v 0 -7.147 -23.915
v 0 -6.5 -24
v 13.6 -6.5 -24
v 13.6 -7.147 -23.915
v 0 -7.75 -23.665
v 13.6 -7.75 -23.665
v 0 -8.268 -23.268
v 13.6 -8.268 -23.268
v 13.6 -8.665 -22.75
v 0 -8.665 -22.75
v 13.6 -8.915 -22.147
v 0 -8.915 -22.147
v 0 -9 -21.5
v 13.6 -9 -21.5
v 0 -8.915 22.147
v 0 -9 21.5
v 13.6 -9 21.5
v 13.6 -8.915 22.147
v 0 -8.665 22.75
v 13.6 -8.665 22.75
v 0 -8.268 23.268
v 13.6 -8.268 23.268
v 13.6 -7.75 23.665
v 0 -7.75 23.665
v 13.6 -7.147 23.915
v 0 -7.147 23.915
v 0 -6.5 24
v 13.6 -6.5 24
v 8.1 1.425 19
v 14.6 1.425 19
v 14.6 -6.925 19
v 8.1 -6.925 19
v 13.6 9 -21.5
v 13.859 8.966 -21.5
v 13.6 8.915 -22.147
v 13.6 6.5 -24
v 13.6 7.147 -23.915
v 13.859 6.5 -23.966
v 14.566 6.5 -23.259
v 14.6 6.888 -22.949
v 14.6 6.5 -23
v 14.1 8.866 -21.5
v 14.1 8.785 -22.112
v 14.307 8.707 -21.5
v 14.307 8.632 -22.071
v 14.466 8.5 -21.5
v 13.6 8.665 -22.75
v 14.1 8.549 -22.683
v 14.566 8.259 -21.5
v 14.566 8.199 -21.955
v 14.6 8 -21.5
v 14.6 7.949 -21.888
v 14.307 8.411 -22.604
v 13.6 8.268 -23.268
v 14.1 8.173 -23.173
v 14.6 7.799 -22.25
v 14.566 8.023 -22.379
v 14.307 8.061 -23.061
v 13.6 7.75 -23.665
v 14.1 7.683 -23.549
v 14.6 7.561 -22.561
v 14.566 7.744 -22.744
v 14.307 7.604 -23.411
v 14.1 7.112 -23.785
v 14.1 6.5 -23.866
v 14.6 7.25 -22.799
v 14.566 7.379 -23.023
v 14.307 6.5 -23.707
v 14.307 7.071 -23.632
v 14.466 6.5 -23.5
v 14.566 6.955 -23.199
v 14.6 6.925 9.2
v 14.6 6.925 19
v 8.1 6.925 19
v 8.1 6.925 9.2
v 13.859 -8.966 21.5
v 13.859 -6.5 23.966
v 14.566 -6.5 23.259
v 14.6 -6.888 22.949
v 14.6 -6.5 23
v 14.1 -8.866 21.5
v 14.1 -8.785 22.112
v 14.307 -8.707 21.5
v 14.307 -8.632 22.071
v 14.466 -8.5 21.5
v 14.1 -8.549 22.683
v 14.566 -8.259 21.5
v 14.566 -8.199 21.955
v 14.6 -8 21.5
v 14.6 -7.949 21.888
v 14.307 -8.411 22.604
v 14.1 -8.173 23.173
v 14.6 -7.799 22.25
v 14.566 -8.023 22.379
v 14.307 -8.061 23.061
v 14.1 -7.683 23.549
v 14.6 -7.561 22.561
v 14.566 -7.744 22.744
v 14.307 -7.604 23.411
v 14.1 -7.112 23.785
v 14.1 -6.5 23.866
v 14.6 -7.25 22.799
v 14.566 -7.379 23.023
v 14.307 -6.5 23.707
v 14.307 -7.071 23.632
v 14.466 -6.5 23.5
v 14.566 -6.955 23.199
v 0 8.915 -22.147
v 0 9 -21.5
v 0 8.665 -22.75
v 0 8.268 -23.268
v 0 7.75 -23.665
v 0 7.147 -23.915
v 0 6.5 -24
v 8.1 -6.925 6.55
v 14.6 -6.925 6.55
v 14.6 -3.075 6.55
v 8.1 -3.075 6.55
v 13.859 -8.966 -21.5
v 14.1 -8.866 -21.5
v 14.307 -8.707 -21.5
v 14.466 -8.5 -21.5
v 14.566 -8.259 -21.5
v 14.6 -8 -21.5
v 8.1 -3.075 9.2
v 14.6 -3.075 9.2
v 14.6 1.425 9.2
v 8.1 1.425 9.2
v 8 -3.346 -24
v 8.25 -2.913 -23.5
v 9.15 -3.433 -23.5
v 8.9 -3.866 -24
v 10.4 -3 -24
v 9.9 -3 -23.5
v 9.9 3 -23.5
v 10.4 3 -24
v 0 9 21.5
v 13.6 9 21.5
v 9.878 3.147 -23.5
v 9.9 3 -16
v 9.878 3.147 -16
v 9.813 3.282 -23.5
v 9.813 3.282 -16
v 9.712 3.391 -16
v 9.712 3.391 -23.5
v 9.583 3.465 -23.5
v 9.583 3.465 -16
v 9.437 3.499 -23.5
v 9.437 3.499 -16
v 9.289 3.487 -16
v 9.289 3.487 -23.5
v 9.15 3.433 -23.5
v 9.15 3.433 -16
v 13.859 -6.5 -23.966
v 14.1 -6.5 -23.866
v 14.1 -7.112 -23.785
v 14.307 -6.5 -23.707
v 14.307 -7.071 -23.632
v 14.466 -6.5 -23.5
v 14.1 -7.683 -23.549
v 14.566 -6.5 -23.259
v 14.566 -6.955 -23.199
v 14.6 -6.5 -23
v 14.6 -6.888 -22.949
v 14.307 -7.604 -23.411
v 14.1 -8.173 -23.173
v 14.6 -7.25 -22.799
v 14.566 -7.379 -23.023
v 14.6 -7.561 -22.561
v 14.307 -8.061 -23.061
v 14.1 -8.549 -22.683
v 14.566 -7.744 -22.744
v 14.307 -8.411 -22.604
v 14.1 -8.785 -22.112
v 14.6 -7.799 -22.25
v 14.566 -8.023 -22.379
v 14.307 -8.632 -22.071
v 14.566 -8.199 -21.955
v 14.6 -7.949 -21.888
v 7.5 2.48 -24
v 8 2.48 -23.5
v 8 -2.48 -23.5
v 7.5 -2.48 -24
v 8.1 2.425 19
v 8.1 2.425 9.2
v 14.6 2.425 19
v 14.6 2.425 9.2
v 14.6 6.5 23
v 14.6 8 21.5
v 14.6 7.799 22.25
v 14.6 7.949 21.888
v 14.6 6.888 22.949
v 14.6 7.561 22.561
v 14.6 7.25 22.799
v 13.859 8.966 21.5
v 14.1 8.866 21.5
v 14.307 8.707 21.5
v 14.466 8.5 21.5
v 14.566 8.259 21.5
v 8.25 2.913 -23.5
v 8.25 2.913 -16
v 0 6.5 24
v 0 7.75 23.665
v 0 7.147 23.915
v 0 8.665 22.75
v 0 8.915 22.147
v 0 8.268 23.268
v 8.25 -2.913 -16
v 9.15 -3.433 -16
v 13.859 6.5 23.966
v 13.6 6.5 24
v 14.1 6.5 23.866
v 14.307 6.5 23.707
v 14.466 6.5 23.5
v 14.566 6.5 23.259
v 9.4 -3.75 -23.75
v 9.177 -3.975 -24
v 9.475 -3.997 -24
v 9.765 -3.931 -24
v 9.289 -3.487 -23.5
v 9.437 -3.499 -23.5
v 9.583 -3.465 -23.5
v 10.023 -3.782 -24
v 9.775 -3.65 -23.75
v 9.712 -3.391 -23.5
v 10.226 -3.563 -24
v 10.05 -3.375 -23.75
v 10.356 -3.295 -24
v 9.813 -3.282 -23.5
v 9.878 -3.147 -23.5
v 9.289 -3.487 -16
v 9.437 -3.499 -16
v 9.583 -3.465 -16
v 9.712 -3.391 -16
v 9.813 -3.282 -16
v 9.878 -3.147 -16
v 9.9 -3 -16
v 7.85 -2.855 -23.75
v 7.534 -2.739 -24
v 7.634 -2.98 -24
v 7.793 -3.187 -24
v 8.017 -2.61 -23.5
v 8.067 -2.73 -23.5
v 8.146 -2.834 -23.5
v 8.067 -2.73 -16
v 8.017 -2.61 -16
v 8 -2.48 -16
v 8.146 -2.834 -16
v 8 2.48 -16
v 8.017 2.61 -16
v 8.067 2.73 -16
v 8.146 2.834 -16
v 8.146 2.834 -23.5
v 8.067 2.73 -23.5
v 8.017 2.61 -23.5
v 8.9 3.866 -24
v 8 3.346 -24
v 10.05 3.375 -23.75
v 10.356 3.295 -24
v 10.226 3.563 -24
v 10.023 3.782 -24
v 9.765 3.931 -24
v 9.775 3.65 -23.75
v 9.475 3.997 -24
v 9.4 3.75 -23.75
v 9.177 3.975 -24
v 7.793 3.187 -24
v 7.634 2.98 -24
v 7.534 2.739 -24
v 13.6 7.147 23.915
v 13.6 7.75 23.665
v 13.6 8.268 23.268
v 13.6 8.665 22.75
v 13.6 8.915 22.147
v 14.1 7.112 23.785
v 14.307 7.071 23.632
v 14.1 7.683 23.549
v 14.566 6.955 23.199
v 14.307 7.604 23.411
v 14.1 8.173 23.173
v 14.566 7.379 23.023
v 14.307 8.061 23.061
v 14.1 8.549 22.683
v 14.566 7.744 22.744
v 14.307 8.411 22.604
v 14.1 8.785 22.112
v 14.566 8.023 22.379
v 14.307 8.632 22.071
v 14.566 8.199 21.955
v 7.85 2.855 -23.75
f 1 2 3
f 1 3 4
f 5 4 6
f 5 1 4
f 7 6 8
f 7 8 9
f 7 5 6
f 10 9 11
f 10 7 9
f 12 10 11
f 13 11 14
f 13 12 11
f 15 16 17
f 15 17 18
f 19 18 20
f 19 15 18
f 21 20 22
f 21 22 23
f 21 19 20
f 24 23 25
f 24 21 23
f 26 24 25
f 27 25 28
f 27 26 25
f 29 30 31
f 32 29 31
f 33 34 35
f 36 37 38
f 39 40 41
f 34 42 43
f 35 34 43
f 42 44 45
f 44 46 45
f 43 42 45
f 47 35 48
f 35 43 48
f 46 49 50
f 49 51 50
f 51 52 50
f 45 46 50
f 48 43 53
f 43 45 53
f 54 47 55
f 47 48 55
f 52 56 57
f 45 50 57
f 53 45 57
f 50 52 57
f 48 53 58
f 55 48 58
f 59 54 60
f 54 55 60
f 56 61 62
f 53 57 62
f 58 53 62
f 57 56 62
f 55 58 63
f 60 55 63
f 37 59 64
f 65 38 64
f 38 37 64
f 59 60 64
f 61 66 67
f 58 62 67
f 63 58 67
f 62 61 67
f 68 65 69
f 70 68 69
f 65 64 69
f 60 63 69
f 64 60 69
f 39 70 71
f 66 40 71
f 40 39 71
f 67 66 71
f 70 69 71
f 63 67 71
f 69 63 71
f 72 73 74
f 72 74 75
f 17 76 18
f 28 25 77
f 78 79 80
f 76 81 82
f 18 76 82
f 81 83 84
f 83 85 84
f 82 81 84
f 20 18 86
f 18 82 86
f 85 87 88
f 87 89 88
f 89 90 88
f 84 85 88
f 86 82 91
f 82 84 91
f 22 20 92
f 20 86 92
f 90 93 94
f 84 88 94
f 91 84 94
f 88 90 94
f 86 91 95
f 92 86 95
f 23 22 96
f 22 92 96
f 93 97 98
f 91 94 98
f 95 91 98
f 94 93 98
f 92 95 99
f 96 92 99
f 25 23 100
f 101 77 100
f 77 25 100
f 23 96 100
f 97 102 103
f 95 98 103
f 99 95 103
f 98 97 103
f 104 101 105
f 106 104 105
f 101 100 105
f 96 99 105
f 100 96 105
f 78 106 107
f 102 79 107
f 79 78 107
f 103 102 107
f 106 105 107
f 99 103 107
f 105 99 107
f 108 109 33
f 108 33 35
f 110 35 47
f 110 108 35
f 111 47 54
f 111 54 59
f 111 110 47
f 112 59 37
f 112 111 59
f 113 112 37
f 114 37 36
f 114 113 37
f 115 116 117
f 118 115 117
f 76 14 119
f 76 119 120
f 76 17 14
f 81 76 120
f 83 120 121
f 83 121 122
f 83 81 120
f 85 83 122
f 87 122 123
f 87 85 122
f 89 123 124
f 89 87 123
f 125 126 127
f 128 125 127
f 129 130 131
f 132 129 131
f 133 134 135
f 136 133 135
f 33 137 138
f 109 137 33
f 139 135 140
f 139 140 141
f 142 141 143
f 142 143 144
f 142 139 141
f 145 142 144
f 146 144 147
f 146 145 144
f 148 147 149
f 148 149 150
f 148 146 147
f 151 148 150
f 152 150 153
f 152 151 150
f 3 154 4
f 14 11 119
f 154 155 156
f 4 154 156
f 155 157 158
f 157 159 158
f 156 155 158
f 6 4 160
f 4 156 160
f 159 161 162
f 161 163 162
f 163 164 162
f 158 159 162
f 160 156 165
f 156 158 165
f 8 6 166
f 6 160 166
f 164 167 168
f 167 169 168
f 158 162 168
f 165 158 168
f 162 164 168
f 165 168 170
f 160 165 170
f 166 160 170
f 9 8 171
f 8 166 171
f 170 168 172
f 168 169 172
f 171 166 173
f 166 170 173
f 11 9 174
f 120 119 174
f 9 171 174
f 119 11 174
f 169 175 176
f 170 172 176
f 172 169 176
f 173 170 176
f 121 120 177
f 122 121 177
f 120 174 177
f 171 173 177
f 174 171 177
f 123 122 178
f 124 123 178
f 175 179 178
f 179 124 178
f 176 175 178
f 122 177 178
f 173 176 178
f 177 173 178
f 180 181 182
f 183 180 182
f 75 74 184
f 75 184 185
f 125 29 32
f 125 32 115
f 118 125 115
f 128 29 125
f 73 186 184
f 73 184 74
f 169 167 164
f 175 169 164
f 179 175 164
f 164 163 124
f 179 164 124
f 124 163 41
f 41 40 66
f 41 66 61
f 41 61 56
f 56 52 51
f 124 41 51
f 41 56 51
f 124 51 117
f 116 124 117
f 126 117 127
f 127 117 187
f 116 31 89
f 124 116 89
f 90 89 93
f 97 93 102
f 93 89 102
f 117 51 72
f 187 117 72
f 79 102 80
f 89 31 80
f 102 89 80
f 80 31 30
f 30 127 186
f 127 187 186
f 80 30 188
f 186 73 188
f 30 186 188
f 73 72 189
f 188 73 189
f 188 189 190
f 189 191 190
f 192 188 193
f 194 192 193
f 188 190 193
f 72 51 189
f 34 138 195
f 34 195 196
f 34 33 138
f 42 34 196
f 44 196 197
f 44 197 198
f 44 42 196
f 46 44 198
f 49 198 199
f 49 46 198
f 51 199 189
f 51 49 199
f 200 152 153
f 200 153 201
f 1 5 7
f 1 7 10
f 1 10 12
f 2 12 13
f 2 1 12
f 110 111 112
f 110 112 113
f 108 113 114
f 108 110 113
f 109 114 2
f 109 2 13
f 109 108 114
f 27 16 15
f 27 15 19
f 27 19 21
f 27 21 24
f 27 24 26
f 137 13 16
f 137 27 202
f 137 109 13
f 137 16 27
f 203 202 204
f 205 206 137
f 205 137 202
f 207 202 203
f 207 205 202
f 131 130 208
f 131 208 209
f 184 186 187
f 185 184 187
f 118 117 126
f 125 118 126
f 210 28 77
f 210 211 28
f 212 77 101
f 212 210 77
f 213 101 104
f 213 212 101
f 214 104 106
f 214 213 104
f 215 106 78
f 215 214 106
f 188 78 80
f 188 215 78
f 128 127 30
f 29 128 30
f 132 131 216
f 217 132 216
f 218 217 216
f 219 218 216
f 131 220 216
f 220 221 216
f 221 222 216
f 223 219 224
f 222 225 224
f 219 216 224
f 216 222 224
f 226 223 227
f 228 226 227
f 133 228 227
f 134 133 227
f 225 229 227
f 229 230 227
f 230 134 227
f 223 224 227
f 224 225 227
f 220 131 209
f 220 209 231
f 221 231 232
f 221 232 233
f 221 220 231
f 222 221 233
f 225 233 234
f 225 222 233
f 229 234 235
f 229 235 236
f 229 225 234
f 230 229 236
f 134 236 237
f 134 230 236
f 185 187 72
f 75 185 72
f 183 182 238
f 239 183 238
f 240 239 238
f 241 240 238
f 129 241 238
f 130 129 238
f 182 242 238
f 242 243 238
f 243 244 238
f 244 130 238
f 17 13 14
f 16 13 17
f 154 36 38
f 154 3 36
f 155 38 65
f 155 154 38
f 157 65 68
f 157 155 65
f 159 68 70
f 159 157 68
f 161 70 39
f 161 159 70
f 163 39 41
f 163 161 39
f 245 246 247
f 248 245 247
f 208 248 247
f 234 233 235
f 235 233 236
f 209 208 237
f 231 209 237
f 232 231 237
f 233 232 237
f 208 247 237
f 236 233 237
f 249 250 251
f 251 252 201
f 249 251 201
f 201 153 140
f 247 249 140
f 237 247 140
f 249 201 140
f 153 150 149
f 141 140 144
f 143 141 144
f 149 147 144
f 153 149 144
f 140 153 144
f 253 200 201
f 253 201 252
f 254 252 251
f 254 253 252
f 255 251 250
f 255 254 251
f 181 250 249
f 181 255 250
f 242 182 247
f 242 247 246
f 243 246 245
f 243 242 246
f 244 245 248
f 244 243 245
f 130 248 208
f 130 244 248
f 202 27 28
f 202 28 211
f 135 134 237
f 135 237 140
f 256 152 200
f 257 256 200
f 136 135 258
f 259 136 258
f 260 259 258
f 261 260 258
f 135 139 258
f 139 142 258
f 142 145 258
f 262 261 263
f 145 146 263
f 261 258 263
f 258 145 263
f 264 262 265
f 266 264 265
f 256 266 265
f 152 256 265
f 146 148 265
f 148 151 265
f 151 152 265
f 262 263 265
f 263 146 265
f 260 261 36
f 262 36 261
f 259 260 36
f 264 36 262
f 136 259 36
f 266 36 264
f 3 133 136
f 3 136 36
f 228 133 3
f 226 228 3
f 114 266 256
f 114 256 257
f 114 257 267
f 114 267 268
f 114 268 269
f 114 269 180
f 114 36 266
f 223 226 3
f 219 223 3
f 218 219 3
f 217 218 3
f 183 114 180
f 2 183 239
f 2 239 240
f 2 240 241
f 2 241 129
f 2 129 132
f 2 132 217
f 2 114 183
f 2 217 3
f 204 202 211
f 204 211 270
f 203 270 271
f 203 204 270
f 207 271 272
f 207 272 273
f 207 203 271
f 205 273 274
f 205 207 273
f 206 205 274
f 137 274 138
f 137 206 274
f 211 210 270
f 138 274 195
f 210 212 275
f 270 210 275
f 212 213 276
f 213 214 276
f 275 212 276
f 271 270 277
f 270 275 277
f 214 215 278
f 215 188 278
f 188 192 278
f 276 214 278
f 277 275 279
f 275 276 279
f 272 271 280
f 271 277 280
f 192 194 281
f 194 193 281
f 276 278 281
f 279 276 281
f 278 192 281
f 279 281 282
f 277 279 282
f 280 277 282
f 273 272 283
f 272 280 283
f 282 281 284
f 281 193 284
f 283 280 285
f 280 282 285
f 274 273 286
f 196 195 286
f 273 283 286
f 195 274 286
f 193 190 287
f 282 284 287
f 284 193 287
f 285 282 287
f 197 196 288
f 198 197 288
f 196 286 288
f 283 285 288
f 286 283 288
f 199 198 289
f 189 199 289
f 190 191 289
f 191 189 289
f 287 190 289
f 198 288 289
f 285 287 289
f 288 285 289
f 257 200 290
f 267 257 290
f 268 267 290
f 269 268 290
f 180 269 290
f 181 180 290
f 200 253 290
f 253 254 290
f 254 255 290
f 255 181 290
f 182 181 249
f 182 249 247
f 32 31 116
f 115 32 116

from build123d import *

# Parameters (mm, degrees)
EXTRUDE_1_DEPTH     = 14.6
FILLET_1_R          = 1
CUT_EXTRUDE_1_DEPTH = 8
CHAMFER_1_SIZE      = 0.5
SKETCH_3_W          = 9.8
SKETCH_3_H          = 4.5
CUT_EXTRUDE_2_DEPTH = 6.5


with BuildPart() as part:
    # ｽｹｯﾁ1 → ﾎﾞｽ - 押し出し1 (new body)
    with BuildSketch(Plane(origin=(0, 0, 0), x_dir=(0, 0, -1), z_dir=(1, 0, 0))):
        with BuildLine():
            Line((-21.5, 9), (21.5, 9))
            ThreePointArc((21.5, 9), (23.267766953, 8.267766953), (24, 6.5))
            Line((24, 6.5), (24, -6.5))
            ThreePointArc((24, -6.5), (23.267766953, -8.267766953), (21.5, -9))
            Line((21.5, -9), (-21.5, -9))
            ThreePointArc((-21.5, -9), (-23.267766953, -8.267766953), (-24, -6.5))
            Line((-24, -6.5), (-24, 6.5))
            ThreePointArc((-24, 6.5), (-23.267766953, 8.267766953), (-21.5, 9))
        make_face()
    extrude(amount=EXTRUDE_1_DEPTH)

    # ﾌｨﾚｯﾄ1
    fillet_1_edges = [part.edges().sort_by_distance(p)[0] for p in [
        (14.6, 8.267766953, 23.267766953),
        (14.6, 0, 24),
        (14.6, -8.267766953, 23.267766953),
        (14.6, -9, 0),
        (14.6, -8.267766953, -23.267766953),
        (14.6, 0, -24),
        (14.6, 8.267766953, -23.267766953),
        (14.6, 9, 0),
    ]]
    fillet(fillet_1_edges, radius=FILLET_1_R)

    # ｽｹｯﾁ2 → ｶｯﾄ - 押し出し1 (cut)
    with BuildSketch(Plane(origin=(0, 0, -24), x_dir=(-1, 0, 0), z_dir=(0, 0, -1))):
        with BuildLine():
            Line((-9.15, 3.433012702), (-8.25, 2.91339746))
            ThreePointArc((-8.25, 2.91339746), (-8.066987298, 2.730384758), (-8, 2.480384758))
            Line((-8, 2.480384758), (-8, -2.480384758))
            ThreePointArc((-8, -2.480384758), (-8.066987298, -2.730384758), (-8.25, -2.91339746))
            Line((-8.25, -2.91339746), (-9.15, -3.433012702))
            ThreePointArc((-9.15, -3.433012702), (-9.65, -3.433012702), (-9.9, -3))
            Line((-9.9, -3), (-9.9, 3))
            ThreePointArc((-9.9, 3), (-9.65, 3.433012702), (-9.15, 3.433012702))
        make_face()
    extrude(amount=-CUT_EXTRUDE_1_DEPTH, mode=Mode.SUBTRACT)

    # 面取り1
    chamfer_1_edges = [part.edges().sort_by_distance(p)[0] for p in [
        (8.066987298, -2.730384758, -24),
        (8, 0, -24),
        (8.066987298, 2.730384758, -24),
        (8.7, 3.173205081, -24),
        (9.65, 3.433012702, -24),
        (9.9, 0, -24),
        (9.65, -3.433012702, -24),
        (8.7, -3.173205081, -24),
    ]]
    chamfer(chamfer_1_edges, length=CHAMFER_1_SIZE)

    # ｽｹｯﾁ3 → ｶｯﾄ - 押し出し2 (cut)
    with BuildSketch(Plane(origin=(14.6, 0, 0), x_dir=(0, 0, -1), z_dir=(1, 0, 0))):
        Polygon((-19, 1.425), (-19, -6.925), (-6.55, -6.925), (-6.55, -3.075), (-9.2, -3.075), (-9.2, 1.425), align=None)
        with Locations((-14.1, 4.675)):
            Rectangle(SKETCH_3_W, SKETCH_3_H)
    extrude(amount=-CUT_EXTRUDE_2_DEPTH, mode=Mode.SUBTRACT)


solid = part.part
